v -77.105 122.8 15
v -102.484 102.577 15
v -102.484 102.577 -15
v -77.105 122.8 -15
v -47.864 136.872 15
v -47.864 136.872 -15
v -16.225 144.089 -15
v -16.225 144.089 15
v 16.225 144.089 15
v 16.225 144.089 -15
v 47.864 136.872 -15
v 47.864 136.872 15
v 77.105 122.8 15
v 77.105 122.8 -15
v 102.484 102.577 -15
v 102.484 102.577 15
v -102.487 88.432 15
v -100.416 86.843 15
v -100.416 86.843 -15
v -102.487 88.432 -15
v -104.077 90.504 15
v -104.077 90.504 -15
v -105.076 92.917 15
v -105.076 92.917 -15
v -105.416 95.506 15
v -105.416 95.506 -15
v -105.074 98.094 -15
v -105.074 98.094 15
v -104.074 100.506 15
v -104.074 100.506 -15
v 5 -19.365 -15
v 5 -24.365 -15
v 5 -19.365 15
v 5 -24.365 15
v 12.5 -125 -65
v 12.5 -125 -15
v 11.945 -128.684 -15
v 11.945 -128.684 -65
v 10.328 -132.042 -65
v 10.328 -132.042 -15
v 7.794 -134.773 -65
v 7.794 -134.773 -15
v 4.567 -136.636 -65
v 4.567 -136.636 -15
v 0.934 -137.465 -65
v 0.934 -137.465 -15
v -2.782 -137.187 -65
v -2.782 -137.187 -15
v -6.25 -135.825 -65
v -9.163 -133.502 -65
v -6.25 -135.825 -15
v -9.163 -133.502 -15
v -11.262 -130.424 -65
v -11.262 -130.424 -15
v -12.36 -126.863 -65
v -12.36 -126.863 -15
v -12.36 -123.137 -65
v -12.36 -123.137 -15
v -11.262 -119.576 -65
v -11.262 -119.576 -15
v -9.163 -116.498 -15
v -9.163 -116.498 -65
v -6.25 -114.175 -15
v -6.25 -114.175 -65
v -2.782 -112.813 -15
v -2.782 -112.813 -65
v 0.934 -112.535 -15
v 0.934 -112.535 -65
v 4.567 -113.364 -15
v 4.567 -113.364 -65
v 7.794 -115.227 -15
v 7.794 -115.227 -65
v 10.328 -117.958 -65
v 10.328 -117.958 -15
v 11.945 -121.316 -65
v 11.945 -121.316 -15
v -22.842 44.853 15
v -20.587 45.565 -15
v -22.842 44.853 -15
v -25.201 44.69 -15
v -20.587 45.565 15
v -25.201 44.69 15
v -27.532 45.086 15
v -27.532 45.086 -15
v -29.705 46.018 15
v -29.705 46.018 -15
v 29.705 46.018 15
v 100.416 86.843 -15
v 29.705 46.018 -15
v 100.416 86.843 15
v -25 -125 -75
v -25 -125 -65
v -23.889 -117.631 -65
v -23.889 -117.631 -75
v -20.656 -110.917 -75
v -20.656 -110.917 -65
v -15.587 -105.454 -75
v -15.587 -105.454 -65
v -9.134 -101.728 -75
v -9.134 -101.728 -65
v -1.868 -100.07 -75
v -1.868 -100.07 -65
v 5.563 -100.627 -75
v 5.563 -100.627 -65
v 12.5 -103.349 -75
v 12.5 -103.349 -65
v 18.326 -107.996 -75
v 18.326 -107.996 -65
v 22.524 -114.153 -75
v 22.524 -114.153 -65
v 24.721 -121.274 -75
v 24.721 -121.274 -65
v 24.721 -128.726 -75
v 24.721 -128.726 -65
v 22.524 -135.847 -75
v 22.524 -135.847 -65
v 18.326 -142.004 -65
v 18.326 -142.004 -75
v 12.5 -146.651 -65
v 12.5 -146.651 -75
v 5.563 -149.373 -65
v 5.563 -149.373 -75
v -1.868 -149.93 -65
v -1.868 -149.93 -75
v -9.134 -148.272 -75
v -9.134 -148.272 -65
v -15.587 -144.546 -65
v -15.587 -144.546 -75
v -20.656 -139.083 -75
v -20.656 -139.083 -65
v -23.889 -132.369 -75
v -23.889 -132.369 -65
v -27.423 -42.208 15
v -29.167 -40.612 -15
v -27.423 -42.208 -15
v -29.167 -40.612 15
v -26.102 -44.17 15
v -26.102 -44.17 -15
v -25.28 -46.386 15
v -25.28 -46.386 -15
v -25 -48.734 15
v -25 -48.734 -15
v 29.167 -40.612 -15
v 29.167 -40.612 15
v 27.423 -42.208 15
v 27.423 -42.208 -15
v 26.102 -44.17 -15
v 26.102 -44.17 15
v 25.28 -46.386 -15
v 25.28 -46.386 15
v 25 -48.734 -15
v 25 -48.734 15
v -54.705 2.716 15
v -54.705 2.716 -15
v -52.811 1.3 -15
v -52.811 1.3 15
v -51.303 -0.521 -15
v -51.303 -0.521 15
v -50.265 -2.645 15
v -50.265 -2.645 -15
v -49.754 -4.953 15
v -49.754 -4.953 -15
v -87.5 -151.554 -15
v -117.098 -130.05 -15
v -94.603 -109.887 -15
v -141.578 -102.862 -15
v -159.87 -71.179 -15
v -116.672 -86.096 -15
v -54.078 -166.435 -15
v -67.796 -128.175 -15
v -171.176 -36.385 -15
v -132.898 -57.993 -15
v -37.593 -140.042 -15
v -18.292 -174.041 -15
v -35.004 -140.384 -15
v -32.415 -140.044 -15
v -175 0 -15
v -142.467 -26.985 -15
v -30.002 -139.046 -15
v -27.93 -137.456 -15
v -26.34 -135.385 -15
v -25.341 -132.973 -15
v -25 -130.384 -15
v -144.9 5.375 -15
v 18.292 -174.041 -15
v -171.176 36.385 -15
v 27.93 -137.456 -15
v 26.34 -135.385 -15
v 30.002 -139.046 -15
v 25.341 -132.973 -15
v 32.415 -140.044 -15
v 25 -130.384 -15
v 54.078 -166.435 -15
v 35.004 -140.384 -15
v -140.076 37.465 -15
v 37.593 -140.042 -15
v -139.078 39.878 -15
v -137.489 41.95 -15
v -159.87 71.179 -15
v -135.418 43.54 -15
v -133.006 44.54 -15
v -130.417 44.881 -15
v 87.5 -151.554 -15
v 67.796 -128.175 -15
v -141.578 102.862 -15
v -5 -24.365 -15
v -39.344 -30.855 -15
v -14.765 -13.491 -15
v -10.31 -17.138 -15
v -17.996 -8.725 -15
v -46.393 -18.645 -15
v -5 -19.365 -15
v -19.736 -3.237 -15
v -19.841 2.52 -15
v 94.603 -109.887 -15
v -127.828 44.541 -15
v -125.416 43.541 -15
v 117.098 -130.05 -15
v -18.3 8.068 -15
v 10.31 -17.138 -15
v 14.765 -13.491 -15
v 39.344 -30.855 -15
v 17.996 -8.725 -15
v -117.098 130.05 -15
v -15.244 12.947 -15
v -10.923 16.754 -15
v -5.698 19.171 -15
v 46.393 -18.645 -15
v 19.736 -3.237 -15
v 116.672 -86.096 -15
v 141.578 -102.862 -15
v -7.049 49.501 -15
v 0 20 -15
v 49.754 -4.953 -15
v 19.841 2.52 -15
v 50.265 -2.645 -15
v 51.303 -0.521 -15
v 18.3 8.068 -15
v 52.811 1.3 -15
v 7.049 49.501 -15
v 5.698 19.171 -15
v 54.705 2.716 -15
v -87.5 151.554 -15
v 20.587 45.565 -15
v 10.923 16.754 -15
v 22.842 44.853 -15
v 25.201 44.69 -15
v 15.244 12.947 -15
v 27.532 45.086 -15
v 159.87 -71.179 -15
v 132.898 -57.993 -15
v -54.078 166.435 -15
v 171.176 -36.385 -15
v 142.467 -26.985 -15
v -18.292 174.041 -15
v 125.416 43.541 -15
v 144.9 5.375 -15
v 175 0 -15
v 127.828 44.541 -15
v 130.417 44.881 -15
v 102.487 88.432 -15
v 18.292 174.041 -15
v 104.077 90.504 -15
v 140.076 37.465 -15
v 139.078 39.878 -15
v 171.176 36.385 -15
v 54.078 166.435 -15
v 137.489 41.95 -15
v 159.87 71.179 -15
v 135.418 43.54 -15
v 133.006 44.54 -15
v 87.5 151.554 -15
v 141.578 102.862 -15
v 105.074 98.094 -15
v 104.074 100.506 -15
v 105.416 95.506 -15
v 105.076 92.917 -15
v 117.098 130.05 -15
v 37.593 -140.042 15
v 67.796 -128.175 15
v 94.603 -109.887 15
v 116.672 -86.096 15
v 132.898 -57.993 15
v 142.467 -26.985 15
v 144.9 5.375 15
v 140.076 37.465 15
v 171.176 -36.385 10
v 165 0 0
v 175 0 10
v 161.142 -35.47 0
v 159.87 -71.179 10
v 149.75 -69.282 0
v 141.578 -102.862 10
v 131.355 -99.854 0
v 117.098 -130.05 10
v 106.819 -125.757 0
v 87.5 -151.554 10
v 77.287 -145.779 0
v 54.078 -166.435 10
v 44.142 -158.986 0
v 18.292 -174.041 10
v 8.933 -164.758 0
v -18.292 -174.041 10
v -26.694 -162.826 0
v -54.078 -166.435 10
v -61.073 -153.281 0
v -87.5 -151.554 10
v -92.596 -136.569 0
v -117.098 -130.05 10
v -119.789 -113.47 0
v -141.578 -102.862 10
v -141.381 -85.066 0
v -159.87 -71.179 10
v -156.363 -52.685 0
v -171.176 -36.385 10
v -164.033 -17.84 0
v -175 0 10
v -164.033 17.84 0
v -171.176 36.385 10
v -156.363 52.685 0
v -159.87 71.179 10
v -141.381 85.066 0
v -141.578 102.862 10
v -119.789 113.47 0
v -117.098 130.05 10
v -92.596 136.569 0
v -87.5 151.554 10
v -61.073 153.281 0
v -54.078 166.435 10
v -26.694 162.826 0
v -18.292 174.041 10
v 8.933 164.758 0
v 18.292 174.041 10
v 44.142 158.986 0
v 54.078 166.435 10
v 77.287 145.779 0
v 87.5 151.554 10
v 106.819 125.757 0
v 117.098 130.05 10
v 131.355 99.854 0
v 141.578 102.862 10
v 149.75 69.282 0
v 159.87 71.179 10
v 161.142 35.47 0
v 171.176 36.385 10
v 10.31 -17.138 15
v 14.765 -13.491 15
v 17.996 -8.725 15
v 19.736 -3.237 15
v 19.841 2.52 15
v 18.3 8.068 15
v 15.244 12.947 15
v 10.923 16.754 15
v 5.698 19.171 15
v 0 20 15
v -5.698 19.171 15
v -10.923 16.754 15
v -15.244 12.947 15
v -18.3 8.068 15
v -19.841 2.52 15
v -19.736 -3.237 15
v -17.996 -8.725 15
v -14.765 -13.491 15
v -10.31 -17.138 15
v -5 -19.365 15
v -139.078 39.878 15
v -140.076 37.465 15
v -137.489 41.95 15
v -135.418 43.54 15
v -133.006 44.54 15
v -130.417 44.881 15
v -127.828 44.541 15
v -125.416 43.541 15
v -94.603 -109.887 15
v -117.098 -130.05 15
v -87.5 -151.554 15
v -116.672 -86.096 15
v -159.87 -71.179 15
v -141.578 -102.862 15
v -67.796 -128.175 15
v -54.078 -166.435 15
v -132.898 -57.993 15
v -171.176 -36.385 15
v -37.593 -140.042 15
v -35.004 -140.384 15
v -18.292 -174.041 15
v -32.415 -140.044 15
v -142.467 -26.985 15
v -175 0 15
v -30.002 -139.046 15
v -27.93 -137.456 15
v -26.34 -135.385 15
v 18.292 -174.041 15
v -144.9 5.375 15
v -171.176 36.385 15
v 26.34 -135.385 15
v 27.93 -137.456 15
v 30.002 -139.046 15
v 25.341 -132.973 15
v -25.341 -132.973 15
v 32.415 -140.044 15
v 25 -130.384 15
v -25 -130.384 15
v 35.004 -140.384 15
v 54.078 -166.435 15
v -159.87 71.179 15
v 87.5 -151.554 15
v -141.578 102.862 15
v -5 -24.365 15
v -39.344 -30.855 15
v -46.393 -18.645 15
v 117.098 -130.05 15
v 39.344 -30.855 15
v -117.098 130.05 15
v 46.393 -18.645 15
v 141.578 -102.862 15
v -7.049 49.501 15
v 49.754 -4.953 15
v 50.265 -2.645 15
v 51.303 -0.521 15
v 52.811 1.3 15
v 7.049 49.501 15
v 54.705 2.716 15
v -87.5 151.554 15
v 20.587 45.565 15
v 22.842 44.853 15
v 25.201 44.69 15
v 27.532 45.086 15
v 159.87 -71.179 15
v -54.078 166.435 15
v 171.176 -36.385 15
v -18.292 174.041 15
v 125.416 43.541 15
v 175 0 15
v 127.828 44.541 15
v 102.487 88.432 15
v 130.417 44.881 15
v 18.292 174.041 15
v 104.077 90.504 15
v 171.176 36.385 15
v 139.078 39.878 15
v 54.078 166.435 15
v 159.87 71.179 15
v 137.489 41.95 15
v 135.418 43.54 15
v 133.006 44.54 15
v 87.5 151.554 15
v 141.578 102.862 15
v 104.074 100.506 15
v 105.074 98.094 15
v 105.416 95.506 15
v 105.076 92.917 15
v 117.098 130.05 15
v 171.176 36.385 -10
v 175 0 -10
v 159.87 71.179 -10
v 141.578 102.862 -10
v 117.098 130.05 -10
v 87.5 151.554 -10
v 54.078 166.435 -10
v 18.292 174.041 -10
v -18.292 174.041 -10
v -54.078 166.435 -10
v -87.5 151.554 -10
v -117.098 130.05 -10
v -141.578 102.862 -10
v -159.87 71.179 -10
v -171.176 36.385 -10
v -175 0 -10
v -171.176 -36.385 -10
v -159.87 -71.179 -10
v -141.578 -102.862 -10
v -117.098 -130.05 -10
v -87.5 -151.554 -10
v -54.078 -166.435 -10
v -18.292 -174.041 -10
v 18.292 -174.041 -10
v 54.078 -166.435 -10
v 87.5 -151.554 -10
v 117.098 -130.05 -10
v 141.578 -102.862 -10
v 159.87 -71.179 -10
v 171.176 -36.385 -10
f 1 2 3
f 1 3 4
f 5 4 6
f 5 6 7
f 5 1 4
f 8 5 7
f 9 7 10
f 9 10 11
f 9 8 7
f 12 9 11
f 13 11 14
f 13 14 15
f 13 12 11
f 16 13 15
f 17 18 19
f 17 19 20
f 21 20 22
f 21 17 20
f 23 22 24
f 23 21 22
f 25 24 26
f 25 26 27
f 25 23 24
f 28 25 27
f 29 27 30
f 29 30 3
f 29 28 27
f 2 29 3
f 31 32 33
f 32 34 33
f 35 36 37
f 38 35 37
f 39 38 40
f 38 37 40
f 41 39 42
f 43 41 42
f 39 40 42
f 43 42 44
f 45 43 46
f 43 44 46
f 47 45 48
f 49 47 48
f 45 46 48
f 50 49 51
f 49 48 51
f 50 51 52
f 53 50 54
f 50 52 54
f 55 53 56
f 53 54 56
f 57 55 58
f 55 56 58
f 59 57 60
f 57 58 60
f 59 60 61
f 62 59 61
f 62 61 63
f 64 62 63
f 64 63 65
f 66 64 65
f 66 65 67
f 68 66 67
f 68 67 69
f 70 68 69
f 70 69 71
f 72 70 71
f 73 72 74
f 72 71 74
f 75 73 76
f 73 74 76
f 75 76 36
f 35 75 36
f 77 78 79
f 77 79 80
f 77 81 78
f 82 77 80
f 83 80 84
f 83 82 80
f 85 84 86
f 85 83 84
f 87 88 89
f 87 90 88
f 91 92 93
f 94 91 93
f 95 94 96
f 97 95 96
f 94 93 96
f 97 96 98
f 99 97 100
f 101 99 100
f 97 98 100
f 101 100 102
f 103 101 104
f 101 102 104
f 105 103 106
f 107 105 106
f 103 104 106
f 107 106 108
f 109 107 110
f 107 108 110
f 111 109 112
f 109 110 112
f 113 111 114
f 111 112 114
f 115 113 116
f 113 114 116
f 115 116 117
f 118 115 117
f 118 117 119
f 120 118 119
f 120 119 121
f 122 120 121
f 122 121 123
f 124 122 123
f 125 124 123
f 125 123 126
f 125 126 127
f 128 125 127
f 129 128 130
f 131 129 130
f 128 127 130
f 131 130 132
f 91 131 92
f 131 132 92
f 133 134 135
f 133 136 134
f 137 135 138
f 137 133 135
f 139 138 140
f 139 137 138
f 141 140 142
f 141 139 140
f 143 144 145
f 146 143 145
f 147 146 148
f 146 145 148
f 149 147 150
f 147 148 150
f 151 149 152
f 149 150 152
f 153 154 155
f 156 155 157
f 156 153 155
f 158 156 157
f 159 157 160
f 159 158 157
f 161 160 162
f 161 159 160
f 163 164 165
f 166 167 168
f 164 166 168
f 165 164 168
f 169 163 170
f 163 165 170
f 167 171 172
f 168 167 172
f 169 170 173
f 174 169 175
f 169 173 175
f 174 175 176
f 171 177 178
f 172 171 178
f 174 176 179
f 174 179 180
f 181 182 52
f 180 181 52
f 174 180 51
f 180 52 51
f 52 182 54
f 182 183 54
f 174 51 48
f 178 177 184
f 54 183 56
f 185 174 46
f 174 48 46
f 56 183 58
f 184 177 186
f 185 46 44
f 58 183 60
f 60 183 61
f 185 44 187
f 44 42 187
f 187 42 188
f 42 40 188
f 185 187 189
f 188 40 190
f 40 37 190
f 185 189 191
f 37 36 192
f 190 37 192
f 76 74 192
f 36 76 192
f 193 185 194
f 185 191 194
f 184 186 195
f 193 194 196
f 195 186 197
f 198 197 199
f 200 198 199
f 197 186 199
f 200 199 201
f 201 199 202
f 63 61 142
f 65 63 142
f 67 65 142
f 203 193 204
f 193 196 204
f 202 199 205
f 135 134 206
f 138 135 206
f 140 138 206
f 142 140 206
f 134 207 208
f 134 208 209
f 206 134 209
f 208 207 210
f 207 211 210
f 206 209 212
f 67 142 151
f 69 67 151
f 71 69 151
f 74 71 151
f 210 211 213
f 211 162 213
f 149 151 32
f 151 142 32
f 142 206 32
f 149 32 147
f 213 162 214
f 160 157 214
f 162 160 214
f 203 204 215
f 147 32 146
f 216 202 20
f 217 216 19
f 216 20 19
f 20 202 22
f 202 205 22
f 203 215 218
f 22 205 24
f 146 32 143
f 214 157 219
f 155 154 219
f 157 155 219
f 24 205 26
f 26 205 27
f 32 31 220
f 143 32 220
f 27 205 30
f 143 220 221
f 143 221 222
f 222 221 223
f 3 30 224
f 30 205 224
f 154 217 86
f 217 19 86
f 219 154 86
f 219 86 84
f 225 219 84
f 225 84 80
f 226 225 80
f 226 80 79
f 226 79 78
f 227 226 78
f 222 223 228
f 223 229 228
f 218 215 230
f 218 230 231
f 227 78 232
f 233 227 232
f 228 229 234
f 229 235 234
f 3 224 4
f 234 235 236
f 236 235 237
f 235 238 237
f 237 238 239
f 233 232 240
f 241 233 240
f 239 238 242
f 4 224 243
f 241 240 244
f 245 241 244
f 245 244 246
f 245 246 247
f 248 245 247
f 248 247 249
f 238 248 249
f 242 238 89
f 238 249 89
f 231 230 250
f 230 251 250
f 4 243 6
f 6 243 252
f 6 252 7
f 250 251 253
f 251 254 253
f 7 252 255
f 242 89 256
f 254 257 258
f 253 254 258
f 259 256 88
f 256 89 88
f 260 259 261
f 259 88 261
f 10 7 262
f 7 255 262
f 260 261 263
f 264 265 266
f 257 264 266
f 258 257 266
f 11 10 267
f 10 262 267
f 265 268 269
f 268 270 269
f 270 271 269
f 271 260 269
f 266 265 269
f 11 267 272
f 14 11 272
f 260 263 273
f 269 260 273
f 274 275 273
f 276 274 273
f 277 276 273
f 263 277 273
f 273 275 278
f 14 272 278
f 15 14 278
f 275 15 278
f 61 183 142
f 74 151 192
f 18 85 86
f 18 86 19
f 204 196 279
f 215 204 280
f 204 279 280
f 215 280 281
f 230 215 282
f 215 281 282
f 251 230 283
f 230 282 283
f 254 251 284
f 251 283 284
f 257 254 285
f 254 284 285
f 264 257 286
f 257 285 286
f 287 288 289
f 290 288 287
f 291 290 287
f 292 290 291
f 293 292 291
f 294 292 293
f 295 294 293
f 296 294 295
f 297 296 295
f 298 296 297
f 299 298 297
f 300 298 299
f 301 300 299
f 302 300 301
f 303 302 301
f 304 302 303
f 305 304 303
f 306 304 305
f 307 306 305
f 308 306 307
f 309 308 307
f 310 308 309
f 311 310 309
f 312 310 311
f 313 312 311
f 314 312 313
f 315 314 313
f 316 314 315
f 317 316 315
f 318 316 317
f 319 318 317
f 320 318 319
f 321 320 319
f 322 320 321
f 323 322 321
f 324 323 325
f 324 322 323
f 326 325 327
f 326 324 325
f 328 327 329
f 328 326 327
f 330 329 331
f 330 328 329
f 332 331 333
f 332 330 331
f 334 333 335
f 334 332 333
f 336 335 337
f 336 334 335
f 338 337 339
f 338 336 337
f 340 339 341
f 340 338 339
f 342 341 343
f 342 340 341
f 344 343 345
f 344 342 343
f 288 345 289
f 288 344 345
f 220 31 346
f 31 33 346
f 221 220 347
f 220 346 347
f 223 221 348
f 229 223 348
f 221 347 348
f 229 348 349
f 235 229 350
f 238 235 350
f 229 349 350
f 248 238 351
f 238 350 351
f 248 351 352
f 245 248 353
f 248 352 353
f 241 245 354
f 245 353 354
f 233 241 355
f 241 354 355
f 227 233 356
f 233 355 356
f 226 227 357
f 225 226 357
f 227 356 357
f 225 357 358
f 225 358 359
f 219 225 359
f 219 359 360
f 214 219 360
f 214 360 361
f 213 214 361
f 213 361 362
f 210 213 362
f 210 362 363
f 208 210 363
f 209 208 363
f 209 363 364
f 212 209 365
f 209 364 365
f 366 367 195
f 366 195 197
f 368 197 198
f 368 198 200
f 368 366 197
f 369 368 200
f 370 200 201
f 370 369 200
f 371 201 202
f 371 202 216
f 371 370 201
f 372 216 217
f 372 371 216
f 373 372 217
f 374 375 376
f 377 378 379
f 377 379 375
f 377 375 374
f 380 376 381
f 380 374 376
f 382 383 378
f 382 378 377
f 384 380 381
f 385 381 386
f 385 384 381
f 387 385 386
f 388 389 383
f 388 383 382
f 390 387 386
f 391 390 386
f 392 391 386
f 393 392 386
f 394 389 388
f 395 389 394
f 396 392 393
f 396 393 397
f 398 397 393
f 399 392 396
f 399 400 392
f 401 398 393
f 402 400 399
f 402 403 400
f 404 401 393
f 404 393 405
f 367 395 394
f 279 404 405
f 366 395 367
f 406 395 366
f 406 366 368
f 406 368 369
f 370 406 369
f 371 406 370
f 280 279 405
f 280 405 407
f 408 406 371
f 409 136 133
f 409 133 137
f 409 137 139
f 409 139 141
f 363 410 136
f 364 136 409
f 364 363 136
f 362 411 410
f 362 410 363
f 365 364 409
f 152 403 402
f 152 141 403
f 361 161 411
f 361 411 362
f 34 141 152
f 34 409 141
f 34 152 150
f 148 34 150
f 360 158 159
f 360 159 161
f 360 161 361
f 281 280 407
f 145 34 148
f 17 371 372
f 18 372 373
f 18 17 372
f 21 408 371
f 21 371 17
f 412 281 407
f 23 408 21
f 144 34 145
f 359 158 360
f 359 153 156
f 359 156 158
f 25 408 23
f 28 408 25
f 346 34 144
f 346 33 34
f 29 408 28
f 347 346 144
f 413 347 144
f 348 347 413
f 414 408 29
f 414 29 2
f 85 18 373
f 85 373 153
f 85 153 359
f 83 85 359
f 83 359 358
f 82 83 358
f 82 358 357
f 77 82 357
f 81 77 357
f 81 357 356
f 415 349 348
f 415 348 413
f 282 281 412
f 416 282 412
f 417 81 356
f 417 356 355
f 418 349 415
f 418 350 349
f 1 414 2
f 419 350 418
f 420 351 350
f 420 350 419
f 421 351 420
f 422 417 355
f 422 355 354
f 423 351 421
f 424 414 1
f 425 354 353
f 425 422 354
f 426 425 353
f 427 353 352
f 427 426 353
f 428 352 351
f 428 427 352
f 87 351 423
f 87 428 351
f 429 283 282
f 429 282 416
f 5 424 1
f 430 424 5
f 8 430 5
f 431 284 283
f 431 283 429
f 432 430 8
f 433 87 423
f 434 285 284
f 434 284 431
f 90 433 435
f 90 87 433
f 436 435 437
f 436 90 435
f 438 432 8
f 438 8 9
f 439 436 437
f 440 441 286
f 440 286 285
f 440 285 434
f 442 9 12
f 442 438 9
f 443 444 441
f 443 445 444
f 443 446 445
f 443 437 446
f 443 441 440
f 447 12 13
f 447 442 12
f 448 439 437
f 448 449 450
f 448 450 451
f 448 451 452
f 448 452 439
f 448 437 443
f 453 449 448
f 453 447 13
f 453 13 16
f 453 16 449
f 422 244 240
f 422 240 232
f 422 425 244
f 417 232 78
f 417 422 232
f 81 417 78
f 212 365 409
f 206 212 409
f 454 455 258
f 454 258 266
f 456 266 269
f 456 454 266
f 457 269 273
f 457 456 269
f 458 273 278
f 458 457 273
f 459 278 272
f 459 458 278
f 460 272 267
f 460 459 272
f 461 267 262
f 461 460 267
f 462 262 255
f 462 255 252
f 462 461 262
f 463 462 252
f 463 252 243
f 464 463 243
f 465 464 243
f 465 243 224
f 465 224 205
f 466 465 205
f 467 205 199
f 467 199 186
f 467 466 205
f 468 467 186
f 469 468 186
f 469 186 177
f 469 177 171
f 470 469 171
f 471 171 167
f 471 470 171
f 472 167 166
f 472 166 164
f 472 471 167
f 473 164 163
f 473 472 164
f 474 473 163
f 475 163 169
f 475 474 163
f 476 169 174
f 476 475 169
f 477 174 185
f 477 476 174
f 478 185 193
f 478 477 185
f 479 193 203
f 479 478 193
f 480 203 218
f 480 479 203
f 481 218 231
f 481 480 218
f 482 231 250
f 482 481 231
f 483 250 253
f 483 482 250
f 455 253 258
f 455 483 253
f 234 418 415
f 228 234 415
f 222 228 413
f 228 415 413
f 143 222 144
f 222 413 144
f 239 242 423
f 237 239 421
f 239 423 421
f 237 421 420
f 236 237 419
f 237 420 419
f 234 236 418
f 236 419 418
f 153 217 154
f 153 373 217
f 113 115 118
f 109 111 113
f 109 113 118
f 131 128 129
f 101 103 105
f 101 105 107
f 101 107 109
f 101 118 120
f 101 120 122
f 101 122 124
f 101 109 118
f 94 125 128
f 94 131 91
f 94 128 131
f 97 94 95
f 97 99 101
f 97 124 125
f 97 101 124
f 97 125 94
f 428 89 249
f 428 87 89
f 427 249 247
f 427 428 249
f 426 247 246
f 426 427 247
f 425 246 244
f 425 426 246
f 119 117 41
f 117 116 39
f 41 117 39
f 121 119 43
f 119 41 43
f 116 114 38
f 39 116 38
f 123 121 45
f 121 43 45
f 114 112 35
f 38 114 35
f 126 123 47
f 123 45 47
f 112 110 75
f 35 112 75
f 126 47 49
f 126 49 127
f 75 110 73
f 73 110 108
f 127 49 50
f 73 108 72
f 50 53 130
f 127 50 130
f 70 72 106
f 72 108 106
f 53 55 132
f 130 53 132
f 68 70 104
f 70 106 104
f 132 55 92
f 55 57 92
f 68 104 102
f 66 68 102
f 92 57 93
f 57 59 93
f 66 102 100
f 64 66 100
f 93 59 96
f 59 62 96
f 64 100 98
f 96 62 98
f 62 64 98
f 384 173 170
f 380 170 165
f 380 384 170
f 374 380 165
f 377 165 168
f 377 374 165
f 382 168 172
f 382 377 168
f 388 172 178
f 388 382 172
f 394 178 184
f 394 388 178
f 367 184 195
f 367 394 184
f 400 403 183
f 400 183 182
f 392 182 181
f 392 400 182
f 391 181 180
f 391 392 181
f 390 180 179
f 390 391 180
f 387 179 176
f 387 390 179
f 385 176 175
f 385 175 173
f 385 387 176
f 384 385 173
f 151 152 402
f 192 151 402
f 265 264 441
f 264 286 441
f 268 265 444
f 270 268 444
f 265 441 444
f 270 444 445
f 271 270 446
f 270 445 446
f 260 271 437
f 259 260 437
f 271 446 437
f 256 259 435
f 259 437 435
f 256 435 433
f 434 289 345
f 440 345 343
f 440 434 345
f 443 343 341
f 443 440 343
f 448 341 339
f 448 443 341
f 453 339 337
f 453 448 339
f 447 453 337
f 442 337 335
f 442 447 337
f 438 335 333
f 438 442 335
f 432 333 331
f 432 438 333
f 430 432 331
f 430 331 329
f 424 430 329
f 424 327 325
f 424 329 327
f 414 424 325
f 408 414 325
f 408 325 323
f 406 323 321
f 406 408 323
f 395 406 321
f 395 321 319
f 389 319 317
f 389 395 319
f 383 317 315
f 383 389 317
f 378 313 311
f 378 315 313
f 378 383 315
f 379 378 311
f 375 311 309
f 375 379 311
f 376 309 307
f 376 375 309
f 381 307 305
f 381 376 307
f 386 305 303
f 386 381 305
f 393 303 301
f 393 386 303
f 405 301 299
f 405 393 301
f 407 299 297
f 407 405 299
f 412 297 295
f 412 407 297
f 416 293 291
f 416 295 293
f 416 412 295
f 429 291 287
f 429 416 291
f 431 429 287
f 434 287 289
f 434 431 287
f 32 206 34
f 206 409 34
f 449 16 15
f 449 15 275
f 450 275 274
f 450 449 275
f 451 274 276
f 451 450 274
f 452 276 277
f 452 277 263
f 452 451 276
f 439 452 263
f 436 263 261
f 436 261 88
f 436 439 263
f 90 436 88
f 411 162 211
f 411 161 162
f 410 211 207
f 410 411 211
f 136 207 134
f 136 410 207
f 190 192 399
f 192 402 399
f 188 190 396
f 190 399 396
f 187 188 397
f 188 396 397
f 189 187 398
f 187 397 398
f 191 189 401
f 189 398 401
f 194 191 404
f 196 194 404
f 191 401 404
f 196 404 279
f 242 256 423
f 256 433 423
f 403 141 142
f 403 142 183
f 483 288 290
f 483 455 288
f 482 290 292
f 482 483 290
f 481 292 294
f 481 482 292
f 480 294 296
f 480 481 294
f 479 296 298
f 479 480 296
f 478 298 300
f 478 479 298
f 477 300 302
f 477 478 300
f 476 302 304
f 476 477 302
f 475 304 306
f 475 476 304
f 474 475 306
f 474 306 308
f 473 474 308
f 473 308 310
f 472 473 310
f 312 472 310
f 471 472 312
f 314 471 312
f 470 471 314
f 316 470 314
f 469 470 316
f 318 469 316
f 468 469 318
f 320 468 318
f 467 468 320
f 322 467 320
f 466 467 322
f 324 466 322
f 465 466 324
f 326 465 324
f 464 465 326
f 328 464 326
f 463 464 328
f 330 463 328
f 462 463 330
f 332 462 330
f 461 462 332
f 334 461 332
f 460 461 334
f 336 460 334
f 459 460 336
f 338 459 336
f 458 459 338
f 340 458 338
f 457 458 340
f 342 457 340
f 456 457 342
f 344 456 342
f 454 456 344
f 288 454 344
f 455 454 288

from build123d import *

# Parameters (mm, degrees)
SKETCH1_R           = 175
BOSS_EXTRUDE4_DEPTH = 15
SKETCH2_R           = 12.5
BOSS_EXTRUDE5_DEPTH = 50
SKETCH3_R           = 25
BOSS_EXTRUDE6_DEPTH = 10


with BuildPart() as part:
    # Sketch1 → Boss-Extrude4 (new, symmetric)
    with BuildSketch(Plane.XY):
        Circle(SKETCH1_R)
        with BuildLine():
            Line((25, -48.733971724), (25, -130.384048104))
            ThreePointArc((25, -130.384048104), (28.914193805, -138.31896858), (37.592592593, -140.042125741))
            ThreePointArc((37.592592593, -140.042125741), (125.573683549, -72.5), (140.076334788, 37.464922691))
            ThreePointArc((140.076334788, 37.464922691), (134.244837518, 44.119057925), (125.415897906, 43.541388957))
            Line((125.415897906, 43.541388957), (54.70485754, 2.716350767))
            ThreePointArc((54.70485754, 2.716350767), (51.30322786, -0.52056309), (49.75404795, -4.953252725))
            ThreePointArc((49.75404795, -4.953252725), (43.301270189, -25), (29.166666667, -40.611643103))
            ThreePointArc((29.166666667, -40.611643103), (26.10243479, -44.169617078), (25, -48.733971724))
        make_face(mode=Mode.SUBTRACT)
        with BuildLine():
            Line((-25, -48.733971724), (-25, -130.384048104))
            ThreePointArc((-25, -130.384048104), (-28.914193805, -138.31896858), (-37.592592593, -140.042125741))
            ThreePointArc((-37.592592593, -140.042125741), (-125.573683549, -72.5), (-140.076334788, 37.464922691))
            ThreePointArc((-140.076334788, 37.464922691), (-134.244837518, 44.119057925), (-125.415897906, 43.541388957))
            Line((-125.415897906, 43.541388957), (-54.70485754, 2.716350767))
            ThreePointArc((-54.70485754, 2.716350767), (-51.30322786, -0.52056309), (-49.75404795, -4.953252725))
            ThreePointArc((-49.75404795, -4.953252725), (-43.301270189, -25), (-29.166666667, -40.611643103))
            ThreePointArc((-29.166666667, -40.611643103), (-26.10243479, -44.169617078), (-25, -48.733971724))
        make_face(mode=Mode.SUBTRACT)
        with BuildLine():
            Line((-29.70485754, 46.017620957), (-100.415897906, 86.842659147))
            ThreePointArc((-100.415897906, 86.842659147), (-105.330643713, 94.199910656), (-102.483742196, 102.57720305))
            ThreePointArc((-102.483742196, 102.57720305), (0, 145), (102.483742196, 102.57720305))
            ThreePointArc((102.483742196, 102.57720305), (105.330643713, 94.199910656), (100.415897906, 86.842659147))
            Line((100.415897906, 86.842659147), (29.70485754, 46.017620957))
            ThreePointArc((29.70485754, 46.017620957), (25.20079307, 44.690180168), (20.587381284, 45.564895829))
            ThreePointArc((20.587381284, 45.564895829), (0, 50), (-20.587381284, 45.564895829))
            ThreePointArc((-20.587381284, 45.564895829), (-25.20079307, 44.690180168), (-29.70485754, 46.017620957))
        make_face(mode=Mode.SUBTRACT)
        with BuildLine():
            Line((-5, -19.364916731), (-5, -24.364916731))
            Line((-5, -24.364916731), (5, -24.364916731))
            Line((5, -24.364916731), (5, -19.364916731))
            ThreePointArc((5, -19.364916731), (0, 20), (-5, -19.364916731))
        make_face(mode=Mode.SUBTRACT)
    extrude(amount=BOSS_EXTRUDE4_DEPTH, both=True)

    # Sketch2 → Boss-Extrude5 (add)
    with BuildSketch(Plane(origin=(0, 0, -15), x_dir=(-1, 0, 0), z_dir=(0, 0, -1))):
        with Locations(Location((0, -125, 0), (0, 0, 180))):
            Circle(SKETCH2_R)
    extrude(amount=BOSS_EXTRUDE5_DEPTH)

    # Sketch3 → Boss-Extrude6 (add)
    with BuildSketch(Plane(origin=(0, 0, -65), x_dir=(-1, 0, 0), z_dir=(0, 0, -1))):
        with Locations((0, -125)):
            Circle(SKETCH3_R)
    extrude(amount=BOSS_EXTRUDE6_DEPTH)

    # Sketch4 → Cut-Revolve1 (revolve, cut)
    with BuildSketch(Plane(origin=(0, 0, 0), x_dir=(1, 0, 0), z_dir=(0, 1, 0)), mode=Mode.PRIVATE) as cut_revolve1_sk:
        Polygon((-175, -10), (-165, 0), (-175, 10), align=None)
    revolve(cut_revolve1_sk.sketch.rotate(Axis((0, 0, 35.70915695), (0, 0, -1)), 180), axis=Axis((0, 0, 35.70915695), (0, 0, -1)), mode=Mode.SUBTRACT)


solid = part.part
